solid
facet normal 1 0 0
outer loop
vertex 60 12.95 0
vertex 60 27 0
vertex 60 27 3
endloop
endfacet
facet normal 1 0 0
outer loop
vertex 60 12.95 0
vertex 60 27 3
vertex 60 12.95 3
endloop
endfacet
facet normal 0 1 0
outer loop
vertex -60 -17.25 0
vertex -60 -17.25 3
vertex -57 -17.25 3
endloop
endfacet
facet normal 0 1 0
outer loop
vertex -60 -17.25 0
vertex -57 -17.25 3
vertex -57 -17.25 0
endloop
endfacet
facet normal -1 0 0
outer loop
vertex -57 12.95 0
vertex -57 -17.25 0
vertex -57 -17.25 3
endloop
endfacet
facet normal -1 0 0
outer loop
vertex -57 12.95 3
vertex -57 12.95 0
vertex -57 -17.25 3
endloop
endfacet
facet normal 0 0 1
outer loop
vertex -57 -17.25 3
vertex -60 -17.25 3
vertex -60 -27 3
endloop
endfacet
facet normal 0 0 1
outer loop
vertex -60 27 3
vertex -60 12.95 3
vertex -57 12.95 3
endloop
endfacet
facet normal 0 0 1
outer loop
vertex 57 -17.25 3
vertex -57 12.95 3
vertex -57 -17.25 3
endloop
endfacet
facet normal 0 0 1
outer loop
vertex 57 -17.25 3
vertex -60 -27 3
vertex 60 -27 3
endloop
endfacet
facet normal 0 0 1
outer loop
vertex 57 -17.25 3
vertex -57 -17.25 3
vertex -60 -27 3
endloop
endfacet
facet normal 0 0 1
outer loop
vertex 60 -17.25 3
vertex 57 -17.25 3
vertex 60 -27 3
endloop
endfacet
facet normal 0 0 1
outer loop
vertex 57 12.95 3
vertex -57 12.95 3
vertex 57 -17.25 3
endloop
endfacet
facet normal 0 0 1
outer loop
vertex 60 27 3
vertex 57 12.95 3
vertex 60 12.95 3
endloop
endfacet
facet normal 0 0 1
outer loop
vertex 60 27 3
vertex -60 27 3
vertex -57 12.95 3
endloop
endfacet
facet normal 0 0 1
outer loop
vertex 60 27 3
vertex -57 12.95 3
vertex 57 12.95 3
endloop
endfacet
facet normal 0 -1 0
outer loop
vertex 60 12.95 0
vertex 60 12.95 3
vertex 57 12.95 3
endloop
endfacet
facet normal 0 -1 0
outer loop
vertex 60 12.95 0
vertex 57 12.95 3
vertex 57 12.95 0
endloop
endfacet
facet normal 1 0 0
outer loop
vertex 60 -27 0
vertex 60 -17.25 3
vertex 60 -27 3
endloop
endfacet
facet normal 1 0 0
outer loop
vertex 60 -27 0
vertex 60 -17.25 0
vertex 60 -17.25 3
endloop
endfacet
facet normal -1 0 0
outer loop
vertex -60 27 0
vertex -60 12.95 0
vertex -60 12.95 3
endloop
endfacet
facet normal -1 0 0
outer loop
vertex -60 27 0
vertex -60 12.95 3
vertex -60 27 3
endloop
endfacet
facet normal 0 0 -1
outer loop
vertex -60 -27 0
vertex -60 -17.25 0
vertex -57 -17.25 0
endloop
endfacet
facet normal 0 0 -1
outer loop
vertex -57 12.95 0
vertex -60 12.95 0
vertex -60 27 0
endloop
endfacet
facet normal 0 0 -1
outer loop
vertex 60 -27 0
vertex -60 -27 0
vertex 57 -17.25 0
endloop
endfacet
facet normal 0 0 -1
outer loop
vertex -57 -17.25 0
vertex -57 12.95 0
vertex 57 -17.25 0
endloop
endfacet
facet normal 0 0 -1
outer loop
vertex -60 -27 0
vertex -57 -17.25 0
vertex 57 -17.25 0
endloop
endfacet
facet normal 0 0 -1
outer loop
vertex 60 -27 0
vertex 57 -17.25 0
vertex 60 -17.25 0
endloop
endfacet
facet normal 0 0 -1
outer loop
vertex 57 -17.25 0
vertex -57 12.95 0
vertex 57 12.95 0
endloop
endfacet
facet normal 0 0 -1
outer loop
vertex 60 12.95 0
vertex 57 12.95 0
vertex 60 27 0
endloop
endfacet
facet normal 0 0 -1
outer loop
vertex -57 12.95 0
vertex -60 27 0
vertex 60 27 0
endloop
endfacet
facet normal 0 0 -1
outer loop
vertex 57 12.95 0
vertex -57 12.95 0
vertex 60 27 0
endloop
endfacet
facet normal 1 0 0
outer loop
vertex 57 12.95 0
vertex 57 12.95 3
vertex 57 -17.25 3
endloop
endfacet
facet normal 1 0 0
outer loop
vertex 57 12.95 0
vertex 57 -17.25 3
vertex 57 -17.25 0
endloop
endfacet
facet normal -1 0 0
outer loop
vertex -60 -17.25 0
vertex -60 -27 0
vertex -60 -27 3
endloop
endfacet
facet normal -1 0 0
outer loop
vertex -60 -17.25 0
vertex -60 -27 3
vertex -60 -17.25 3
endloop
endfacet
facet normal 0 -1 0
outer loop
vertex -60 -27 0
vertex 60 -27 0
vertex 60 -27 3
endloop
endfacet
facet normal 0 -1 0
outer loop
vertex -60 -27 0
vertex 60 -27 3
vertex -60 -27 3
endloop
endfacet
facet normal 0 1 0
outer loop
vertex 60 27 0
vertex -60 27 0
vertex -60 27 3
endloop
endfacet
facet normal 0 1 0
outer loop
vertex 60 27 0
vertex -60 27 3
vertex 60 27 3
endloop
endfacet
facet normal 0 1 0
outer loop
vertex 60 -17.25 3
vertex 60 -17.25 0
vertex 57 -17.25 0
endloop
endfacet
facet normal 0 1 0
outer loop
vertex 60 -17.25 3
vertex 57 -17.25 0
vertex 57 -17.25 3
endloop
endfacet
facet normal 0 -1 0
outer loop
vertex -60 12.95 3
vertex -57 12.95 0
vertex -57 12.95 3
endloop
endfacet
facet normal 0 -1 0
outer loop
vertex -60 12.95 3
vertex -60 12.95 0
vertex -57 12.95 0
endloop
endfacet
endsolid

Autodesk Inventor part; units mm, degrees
ref_plane "YZ Plane" through (0, 0, 0) normal (1, 0, 0) x (0, 1, 0)
ref_plane "XZ Plane" through (0, 0, 0) normal (0, 1, 0) x (-1, 0, 0)
ref_plane "XY Plane" through (0, 0, 0) normal (0, 0, 1) x (1, 0, 0)
sketch "Esboço1" plane through (0, 0, 0) normal (0, 0, 1) x (1, 0, 0)
  line L0 (60, -27) -> (-60, -27)
  line L1 (-60, -27) -> (-60, 27)
  line L2 (-60, 27) -> (60, 27)
  line L3 (60, 27) -> (60, -27)
  line L4 (60, -27) -> (-60, 27) construction
  line L5 (-60, -27) -> (60, 27) construction
  point P0 (0, 0)
  dimension "d0" = 120
  dimension "d1" = 54
extrude "Extrusão1" add sketch "Esboço1" along normal blind 3
sketch "Esboço2" plane through (60, -27, 0) normal (1, 0, 0) x (0, 0, -1)
  line L0 (0, 54) -> (0, 43.9)
  line L1 (0, 54) -> (0, 0) projected
  line L2 (0, 0) -> (0, 9.75)
  line L3 (0, 9.75) -> (-3, 9.75)
  line L4 (-3, 9.75) -> (-3, 39.95)
  line L5 (-3, 39.95) -> (0, 39.95)
  line L6 (0, 39.95) -> (0, 9.75)
  point P0 (0, 27)
  point P1 (0, 39.95)
  point P2 (-1.5, 9.75)
  point P3 (-1.5, 39.95)
  dimension "d5" = 9.75
  dimension "d6" = 3
  dimension "d22" = 30.2
extrude "Extrusão2" cut sketch "Esboço2" against normal blind 3
sketch "Esboço3" plane through (-60, -27, 0) normal (-1, 0, 0) x (0, 0, 1)
  line L0 (3, 39.95) -> (3, 54) projected
  line L1 (3, 54) -> (3, 39.95)
  line L2 (3, 0) -> (3, 9.75) projected
  line L3 (3, 0) -> (3, 9.75)
  line L4 (0, 39.95) -> (0, 9.75) projected
  line L5 (3, 9.75) -> (0, 9.75)
  line L6 (0, 9.75) -> (0, 39.95)
  line L7 (0, 39.95) -> (3, 39.95)
  line L8 (3, 39.95) -> (3, 9.75)
  point P0 (0, 27)
extrude "Extrusão3" cut sketch "Esboço3" against normal blind 3
sketch "Esboço4" plane through (-60, 27, 0) normal (0, 1, 0) x (1, 0, 0)
  point P0 (60, 0)
properties part number "top inclinado"
